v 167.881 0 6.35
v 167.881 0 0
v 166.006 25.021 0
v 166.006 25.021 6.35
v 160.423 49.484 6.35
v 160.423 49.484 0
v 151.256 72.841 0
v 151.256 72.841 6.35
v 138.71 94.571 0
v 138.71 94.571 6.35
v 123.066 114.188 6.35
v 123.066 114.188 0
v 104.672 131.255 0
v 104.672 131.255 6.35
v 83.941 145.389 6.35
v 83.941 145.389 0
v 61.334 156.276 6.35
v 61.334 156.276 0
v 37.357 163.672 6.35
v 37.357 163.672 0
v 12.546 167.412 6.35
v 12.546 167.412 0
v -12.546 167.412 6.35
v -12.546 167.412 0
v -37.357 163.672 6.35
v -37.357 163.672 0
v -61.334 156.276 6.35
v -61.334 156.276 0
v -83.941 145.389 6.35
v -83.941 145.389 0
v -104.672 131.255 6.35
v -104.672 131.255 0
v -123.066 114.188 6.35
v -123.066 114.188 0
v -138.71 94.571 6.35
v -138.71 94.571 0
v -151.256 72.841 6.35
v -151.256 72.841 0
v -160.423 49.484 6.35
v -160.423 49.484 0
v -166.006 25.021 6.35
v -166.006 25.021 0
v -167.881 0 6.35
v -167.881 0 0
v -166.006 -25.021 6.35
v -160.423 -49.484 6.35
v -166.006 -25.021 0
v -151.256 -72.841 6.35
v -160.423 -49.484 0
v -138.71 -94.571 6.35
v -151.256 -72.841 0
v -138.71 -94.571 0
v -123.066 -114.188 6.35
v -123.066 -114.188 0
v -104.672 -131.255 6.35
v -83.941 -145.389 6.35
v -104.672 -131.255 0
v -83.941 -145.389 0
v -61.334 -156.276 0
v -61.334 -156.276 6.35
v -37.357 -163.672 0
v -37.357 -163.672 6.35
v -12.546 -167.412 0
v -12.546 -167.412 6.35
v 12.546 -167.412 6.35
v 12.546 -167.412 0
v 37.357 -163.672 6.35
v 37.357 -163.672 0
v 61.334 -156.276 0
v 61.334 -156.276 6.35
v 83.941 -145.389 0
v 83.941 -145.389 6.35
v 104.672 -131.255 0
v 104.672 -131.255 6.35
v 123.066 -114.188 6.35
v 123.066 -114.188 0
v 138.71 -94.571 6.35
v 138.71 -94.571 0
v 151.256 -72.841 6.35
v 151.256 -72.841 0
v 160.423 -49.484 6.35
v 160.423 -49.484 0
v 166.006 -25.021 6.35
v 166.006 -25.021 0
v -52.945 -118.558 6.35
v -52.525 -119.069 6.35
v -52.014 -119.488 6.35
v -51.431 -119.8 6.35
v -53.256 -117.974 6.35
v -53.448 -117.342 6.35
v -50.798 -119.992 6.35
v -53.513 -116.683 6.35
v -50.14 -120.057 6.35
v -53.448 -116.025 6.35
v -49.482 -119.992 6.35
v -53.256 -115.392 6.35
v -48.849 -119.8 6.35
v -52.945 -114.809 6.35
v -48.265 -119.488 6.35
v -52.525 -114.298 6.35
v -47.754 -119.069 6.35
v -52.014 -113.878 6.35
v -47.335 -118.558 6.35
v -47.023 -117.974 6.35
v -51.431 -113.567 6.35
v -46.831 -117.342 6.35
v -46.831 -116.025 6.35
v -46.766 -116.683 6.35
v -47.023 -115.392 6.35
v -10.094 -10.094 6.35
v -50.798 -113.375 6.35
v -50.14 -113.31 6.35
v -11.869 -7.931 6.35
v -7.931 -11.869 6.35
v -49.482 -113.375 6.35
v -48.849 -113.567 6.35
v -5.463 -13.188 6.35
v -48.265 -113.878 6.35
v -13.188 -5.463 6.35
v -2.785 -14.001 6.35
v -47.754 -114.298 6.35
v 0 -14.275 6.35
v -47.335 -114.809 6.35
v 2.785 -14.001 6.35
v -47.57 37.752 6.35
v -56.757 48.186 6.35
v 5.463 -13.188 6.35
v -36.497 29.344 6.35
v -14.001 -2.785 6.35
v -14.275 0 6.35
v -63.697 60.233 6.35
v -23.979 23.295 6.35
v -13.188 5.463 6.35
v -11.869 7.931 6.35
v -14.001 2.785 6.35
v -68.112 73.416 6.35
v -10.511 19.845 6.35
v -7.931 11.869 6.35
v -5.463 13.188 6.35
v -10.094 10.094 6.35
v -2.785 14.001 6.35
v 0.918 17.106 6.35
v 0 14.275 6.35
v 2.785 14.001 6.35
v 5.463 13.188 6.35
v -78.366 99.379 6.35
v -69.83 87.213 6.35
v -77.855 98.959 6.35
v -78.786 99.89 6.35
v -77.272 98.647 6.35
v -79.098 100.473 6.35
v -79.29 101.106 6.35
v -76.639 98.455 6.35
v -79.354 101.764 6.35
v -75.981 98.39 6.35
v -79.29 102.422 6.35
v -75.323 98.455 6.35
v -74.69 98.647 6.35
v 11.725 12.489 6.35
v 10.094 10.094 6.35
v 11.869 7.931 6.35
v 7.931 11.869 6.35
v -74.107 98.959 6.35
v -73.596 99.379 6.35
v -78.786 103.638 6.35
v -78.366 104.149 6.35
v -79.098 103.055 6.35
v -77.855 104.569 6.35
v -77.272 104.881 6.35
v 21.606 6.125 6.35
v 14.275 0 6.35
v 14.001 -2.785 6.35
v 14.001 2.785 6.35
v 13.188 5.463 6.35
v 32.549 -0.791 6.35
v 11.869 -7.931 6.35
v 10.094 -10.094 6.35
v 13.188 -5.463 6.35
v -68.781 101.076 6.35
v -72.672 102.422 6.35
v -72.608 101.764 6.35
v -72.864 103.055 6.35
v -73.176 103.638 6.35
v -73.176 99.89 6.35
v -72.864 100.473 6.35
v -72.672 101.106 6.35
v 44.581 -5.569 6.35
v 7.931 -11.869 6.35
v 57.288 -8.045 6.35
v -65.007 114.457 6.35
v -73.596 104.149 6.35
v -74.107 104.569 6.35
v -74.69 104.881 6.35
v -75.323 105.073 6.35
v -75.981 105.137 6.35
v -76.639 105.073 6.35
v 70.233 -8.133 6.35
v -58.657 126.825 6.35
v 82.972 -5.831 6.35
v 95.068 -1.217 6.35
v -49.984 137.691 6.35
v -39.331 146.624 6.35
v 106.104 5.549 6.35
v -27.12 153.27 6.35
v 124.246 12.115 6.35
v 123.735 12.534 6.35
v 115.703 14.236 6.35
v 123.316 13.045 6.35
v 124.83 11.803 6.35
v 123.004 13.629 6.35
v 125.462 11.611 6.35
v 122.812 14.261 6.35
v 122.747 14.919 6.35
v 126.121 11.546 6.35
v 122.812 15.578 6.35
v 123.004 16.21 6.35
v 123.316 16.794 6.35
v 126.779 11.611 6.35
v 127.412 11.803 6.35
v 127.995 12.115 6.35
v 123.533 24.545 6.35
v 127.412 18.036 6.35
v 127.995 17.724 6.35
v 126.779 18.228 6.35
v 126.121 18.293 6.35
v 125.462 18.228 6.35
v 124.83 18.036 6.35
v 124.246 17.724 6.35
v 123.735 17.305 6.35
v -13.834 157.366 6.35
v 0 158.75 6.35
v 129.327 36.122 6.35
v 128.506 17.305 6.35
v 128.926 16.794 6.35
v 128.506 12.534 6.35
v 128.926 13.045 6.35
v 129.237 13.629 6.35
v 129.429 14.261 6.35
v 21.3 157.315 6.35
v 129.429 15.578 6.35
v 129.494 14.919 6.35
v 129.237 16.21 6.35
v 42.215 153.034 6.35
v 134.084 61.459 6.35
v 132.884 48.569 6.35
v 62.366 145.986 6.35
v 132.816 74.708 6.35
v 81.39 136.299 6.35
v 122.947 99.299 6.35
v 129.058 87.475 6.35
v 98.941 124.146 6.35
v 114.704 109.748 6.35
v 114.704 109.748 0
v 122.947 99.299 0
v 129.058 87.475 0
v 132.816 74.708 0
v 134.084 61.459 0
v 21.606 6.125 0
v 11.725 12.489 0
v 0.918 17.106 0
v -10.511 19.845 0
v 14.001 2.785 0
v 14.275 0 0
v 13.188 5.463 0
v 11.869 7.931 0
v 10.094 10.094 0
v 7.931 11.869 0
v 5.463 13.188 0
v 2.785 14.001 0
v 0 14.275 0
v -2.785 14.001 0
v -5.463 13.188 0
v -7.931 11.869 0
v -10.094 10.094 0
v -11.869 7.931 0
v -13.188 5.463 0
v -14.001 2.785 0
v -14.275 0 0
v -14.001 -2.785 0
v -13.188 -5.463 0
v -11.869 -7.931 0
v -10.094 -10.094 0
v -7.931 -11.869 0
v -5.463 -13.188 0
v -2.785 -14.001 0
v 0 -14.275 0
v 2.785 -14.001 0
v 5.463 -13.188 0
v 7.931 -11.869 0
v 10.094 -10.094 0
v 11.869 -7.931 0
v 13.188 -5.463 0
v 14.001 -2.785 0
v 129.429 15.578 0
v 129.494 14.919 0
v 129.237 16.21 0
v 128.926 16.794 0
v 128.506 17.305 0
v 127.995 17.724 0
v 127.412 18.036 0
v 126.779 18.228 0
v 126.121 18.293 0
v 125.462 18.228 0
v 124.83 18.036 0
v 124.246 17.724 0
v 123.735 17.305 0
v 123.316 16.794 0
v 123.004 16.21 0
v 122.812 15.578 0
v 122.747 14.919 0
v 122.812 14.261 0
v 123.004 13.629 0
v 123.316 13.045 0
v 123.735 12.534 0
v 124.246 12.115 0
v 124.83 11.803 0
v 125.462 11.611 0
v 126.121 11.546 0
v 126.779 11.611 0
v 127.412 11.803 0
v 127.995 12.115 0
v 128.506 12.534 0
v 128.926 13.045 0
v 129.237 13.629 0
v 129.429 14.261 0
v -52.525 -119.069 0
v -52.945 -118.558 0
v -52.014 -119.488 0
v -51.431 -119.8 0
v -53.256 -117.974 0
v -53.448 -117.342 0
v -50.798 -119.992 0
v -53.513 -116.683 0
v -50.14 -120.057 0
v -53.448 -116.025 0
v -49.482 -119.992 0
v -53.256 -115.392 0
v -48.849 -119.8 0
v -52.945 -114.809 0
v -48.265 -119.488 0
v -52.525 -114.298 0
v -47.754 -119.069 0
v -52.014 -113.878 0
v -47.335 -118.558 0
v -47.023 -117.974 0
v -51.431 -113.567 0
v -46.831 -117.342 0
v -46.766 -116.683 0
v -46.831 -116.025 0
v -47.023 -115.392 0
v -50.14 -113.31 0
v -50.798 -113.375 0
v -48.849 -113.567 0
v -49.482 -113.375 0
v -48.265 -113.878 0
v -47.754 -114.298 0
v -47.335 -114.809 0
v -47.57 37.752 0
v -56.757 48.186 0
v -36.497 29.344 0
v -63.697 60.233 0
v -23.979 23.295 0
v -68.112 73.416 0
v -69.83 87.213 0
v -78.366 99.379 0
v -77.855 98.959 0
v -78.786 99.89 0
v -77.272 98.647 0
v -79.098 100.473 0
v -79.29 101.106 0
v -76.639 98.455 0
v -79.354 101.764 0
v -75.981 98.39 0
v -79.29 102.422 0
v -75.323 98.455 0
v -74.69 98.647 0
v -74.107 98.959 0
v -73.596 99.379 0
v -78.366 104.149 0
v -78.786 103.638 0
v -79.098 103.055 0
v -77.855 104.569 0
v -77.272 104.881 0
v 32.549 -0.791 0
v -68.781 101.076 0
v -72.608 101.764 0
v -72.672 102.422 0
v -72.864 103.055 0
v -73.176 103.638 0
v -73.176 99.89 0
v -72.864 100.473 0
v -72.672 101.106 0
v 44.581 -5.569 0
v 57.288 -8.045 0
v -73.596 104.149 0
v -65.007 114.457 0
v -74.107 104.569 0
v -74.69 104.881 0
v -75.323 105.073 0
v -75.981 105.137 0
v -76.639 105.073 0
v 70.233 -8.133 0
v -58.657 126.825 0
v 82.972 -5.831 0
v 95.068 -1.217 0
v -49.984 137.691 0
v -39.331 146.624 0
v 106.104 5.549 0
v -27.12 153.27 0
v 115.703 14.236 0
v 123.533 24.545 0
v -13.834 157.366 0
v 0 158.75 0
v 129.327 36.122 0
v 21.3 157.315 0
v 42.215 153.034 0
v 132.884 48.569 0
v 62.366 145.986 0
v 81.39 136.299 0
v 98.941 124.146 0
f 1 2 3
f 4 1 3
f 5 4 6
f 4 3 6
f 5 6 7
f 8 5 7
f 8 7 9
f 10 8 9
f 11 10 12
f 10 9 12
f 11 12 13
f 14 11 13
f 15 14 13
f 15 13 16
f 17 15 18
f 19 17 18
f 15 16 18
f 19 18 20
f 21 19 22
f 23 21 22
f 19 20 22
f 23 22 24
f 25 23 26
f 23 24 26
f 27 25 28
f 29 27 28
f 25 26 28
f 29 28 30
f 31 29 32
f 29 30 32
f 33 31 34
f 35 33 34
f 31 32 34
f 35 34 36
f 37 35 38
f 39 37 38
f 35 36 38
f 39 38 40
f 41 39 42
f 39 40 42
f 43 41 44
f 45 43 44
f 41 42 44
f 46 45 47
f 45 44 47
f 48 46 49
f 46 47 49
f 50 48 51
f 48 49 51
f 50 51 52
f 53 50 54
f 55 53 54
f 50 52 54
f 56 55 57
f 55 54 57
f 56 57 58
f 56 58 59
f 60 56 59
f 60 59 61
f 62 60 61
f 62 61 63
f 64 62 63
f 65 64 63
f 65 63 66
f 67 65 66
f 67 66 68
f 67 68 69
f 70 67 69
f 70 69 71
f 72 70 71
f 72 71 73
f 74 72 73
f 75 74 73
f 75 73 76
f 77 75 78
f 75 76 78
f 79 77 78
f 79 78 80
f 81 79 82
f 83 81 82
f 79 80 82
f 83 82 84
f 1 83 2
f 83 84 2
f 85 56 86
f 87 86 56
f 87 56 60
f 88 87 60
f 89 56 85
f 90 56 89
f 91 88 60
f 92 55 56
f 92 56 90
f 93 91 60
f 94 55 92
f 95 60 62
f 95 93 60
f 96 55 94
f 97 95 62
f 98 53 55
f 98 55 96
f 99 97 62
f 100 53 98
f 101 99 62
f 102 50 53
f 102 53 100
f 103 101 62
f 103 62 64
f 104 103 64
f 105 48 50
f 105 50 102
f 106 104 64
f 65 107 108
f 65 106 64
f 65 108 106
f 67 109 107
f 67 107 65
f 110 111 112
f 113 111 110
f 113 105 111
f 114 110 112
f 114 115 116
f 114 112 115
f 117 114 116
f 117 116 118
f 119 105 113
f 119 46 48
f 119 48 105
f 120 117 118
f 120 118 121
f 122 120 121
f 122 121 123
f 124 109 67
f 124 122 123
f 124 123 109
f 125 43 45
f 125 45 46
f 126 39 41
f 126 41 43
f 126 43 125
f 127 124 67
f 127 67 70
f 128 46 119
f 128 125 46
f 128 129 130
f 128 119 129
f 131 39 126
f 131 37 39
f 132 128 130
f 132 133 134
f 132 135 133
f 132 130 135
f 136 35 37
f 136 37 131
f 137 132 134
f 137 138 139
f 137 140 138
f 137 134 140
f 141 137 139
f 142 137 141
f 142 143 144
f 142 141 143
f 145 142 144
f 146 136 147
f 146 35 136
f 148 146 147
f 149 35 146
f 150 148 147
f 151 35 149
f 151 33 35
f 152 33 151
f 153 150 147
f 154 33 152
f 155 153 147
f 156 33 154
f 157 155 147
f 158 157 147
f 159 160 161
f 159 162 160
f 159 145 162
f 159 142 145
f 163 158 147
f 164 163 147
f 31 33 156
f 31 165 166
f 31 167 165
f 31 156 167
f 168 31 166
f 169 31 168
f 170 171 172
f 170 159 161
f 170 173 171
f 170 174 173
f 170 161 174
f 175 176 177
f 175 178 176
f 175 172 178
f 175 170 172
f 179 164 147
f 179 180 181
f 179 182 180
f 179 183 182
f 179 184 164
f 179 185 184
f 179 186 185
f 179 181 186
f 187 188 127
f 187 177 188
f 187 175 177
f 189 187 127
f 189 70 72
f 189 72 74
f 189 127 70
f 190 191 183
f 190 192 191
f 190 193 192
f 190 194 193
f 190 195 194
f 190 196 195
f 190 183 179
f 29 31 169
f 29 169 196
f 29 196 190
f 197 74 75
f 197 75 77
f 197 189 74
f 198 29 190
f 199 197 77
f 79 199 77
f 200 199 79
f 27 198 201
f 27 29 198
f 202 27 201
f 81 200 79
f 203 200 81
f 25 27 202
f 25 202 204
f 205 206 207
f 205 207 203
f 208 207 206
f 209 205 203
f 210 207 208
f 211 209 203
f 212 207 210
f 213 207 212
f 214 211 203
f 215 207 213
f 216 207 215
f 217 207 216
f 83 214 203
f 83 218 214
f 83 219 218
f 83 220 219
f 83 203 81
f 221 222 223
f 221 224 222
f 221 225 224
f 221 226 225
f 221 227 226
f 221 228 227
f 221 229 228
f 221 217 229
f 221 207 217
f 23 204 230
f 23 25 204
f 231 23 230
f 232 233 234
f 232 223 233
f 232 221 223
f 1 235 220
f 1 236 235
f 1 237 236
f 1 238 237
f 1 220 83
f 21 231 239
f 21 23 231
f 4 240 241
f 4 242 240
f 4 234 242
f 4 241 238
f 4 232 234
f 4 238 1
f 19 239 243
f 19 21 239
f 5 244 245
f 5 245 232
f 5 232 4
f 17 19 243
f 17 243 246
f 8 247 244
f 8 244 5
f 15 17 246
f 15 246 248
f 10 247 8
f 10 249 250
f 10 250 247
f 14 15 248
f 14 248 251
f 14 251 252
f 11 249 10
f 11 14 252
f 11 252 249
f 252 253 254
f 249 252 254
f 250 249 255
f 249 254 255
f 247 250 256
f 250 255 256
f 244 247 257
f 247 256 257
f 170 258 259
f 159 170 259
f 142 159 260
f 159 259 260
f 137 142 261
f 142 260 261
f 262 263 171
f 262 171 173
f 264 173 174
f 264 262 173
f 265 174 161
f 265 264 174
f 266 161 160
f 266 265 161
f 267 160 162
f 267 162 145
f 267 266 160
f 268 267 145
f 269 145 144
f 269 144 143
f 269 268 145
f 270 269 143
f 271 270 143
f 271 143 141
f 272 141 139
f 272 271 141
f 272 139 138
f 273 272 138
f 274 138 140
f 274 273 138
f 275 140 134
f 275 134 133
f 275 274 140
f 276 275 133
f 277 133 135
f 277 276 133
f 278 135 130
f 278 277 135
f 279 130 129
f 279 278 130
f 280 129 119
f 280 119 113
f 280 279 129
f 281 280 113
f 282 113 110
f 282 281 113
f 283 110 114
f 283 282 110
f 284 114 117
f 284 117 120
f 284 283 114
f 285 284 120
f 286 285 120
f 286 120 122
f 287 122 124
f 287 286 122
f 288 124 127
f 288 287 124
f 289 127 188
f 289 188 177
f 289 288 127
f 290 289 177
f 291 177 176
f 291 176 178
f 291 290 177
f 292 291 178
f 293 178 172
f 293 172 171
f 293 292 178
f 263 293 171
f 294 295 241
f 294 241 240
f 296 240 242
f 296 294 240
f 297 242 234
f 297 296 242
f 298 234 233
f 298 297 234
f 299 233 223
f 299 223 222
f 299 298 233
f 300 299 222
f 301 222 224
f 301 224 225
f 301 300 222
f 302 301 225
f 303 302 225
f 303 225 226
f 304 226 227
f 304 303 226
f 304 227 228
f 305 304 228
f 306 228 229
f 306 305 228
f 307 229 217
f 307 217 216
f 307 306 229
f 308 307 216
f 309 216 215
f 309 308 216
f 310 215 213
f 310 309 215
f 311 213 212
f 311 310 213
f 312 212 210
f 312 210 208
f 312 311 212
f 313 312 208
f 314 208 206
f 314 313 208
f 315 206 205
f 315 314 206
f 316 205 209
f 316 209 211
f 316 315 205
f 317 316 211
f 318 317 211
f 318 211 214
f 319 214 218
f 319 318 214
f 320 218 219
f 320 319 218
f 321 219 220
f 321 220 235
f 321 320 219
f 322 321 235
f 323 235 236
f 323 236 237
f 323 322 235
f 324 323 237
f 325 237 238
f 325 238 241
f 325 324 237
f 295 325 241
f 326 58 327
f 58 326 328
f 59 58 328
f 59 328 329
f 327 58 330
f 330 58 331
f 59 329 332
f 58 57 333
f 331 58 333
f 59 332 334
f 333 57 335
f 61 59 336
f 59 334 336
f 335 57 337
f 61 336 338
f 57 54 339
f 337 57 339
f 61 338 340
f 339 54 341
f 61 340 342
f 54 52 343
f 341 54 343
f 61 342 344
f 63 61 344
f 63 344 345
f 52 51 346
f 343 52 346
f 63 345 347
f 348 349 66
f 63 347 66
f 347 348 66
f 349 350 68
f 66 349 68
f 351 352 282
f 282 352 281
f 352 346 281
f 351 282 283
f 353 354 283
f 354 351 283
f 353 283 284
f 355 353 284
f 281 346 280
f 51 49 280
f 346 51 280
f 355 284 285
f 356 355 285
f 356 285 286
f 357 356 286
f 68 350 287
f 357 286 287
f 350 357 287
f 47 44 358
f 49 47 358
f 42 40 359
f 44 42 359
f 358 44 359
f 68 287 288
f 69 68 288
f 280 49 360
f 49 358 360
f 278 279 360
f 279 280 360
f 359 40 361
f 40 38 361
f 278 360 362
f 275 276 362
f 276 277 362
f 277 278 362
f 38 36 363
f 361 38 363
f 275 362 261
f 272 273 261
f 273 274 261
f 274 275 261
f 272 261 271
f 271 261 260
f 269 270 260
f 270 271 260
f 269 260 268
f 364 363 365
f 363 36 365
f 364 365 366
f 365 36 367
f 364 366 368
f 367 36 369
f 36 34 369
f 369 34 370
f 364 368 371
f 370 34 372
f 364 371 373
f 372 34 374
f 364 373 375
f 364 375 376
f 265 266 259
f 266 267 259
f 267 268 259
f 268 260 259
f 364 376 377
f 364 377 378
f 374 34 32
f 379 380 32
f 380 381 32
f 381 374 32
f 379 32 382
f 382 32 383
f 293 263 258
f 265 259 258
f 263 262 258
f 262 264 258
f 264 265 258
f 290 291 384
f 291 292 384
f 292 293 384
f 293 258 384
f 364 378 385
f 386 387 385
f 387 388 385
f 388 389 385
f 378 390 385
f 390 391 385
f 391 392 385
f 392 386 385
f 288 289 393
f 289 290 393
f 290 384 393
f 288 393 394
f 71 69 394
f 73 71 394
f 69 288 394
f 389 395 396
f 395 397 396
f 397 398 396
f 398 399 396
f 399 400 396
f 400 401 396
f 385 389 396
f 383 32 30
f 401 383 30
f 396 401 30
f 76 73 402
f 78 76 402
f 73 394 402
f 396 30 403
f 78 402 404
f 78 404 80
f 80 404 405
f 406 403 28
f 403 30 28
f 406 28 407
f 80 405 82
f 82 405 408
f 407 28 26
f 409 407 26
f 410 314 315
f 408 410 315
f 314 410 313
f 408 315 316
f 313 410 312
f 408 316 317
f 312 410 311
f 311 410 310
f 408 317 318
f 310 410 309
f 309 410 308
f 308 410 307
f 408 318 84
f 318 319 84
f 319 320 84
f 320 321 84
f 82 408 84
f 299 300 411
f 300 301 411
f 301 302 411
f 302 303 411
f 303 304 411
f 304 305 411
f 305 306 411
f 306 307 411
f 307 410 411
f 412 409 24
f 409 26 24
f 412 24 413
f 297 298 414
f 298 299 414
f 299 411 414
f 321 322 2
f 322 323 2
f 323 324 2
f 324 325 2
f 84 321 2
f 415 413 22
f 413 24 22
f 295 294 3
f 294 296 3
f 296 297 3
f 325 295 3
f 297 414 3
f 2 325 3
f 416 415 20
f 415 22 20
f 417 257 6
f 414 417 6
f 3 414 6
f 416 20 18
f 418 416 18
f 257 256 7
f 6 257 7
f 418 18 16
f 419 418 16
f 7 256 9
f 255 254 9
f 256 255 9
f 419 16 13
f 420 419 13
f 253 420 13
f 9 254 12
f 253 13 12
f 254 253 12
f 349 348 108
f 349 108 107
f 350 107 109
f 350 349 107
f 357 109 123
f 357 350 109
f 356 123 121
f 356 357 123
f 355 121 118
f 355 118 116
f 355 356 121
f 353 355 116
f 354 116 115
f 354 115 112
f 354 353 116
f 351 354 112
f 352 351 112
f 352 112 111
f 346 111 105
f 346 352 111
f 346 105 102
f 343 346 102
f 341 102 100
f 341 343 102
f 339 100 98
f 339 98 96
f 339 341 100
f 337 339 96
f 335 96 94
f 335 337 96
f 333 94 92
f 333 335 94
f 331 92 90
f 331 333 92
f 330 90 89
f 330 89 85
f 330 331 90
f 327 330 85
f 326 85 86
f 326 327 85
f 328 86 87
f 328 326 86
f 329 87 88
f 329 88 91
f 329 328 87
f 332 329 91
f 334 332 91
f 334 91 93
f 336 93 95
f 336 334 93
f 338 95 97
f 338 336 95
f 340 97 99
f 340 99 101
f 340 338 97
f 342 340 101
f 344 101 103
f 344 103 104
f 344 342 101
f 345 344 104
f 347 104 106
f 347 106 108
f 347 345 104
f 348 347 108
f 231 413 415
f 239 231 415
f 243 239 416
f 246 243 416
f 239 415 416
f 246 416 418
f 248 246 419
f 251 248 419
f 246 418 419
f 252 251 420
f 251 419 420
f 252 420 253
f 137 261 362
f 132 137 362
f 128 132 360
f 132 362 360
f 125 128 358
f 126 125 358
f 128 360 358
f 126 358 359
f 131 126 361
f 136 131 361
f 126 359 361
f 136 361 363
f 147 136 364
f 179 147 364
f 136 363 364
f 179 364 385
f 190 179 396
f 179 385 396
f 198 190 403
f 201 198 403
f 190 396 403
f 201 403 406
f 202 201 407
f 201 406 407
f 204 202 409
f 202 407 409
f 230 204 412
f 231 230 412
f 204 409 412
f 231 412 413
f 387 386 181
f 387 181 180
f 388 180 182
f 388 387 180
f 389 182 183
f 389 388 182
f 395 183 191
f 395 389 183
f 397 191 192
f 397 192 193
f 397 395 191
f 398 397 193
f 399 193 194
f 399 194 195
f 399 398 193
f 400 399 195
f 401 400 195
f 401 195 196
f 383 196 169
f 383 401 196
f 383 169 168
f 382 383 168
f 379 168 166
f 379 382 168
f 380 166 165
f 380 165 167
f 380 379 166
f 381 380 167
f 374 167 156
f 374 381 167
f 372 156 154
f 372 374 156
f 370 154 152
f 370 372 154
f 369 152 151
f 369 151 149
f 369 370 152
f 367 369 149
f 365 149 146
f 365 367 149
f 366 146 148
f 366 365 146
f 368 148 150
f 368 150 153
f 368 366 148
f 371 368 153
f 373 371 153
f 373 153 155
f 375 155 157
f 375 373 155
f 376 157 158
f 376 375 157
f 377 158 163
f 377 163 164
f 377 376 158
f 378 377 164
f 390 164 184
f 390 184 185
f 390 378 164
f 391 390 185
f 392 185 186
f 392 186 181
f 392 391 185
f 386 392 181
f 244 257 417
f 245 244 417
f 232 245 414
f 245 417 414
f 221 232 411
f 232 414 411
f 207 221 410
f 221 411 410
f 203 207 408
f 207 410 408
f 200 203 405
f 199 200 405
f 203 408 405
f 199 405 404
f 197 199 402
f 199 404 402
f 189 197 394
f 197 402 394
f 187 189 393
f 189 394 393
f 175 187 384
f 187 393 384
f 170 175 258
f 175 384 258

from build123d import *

# Parameters (mm, degrees)
F0_R     = 167.8813
F0_R_2   = 3.373438
F0_R_3   = 14.2748
F1_DEPTH = 6.35


with BuildPart() as f1:
    # F0 (on Top) → F1 (new body)
    with BuildSketch(Plane.XY):
        Circle(F0_R)
        with BuildLine():
            ThreePointArc((158.75, 0), (-112.253202, -112.253201), (1e-06, 158.75))
            ThreePointArc((1e-06, 158.75), (62.366073, 145.986422), (114.703619, 109.748086))
            ThreePointArc((114.703619, 109.748086), (147.327462, 59.128517), (158.75, 0))
        make_face(mode=Mode.SUBTRACT)
        with BuildLine():
            ThreePointArc((-10.511197, 19.845404), (-69.650865, 94.170625), (1e-06, 158.75))
            ThreePointArc((1e-06, 158.75), (-112.253202, -112.253201), (158.75, 0))
            ThreePointArc((158.75, 0), (147.327462, 59.128517), (114.703619, 109.748086))
            ThreePointArc((114.703619, 109.748086), (129.058109, 87.475476), (134.084026, 61.458929))
            ThreePointArc((134.084026, 61.458929), (95.06779, -1.217235), (21.605816, 6.124868))
            ThreePointArc((21.605816, 6.124868), (41.65377, -18.375428), (48.827607, -49.209192))
            ThreePointArc((48.827607, -49.209192), (-73.999887, -94.732897), (-10.511197, 19.845404))
        make_face()
        with Locations((-50.139664, -116.683392)):
            Circle(F0_R_2, mode=Mode.SUBTRACT)
        with Locations((-75.98095, 101.763919)):
            Circle(F0_R_2, mode=Mode.SUBTRACT)
        with Locations((126.120614, 14.919473)):
            Circle(F0_R_2, mode=Mode.SUBTRACT)
        with BuildLine():
            ThreePointArc((21.605816, 6.124868), (6.418678, 15.024834), (-10.511197, 19.845404))
            ThreePointArc((-10.511197, 19.845404), (-73.999887, -94.732897), (48.827607, -49.209192))
            ThreePointArc((48.827607, -49.209192), (41.65377, -18.375428), (21.605816, 6.124868))
        make_face()
        Circle(F0_R_3, mode=Mode.SUBTRACT)
    extrude(amount=F1_DEPTH)


solid = f1.part
